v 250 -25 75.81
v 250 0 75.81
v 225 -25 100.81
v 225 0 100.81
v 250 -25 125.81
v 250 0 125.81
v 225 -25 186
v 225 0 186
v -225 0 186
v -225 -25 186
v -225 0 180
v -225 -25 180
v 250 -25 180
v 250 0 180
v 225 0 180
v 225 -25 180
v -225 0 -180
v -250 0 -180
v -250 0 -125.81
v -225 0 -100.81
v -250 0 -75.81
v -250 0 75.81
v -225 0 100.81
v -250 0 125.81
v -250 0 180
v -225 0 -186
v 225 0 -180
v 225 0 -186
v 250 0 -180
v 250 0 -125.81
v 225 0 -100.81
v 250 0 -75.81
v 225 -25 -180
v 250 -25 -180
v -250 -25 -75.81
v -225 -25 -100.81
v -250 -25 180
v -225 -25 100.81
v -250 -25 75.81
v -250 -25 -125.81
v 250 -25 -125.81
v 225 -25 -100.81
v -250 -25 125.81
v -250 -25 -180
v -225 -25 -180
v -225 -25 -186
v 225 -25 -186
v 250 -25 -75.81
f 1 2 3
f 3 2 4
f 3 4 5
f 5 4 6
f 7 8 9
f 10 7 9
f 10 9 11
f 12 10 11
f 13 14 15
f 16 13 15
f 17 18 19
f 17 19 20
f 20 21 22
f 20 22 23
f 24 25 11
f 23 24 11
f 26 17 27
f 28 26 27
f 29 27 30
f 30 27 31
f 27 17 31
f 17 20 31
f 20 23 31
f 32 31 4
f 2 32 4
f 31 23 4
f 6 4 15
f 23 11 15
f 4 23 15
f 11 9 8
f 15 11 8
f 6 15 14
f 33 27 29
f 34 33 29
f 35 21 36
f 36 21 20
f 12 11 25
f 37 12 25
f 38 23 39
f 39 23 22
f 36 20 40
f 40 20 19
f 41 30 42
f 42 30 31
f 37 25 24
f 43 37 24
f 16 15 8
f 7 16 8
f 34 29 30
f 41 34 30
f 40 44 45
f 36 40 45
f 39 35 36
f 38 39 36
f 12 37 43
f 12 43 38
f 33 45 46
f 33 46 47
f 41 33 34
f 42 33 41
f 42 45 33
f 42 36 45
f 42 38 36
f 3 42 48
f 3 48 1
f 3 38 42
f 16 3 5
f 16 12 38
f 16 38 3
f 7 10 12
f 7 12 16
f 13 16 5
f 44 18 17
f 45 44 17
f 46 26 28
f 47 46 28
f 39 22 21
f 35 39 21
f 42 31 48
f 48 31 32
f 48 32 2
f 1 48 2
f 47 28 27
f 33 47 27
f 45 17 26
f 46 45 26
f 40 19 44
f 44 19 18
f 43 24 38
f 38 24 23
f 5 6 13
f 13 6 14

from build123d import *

# Parameters (mm, degrees)
F1_DEPTH = 25


with BuildPart() as f1:
    # F0 (on Front) → F1 (new body)
    with BuildSketch(Plane.XZ):
        Polygon((225, 186), (0, 186), (-225, 186), (-225, 180), (-250, 180), (-250, 125.809848), (-225, 100.809848), (-250, 75.809848), (-250, 0), (-250, -75.809848), (-225, -100.809848), (-250, -125.809848), (-250, -180), (-225, -180), (-225, -186), (0, -186), (225, -186), (225, -180), (250, -180), (250, -125.809848), (225, -100.809848), (250, -75.809848), (250, 0), (250, 75.809848), (225, 100.809848), (250, 125.809848), (250, 180), (225, 180), align=None)
    extrude(amount=F1_DEPTH)


solid = f1.part
